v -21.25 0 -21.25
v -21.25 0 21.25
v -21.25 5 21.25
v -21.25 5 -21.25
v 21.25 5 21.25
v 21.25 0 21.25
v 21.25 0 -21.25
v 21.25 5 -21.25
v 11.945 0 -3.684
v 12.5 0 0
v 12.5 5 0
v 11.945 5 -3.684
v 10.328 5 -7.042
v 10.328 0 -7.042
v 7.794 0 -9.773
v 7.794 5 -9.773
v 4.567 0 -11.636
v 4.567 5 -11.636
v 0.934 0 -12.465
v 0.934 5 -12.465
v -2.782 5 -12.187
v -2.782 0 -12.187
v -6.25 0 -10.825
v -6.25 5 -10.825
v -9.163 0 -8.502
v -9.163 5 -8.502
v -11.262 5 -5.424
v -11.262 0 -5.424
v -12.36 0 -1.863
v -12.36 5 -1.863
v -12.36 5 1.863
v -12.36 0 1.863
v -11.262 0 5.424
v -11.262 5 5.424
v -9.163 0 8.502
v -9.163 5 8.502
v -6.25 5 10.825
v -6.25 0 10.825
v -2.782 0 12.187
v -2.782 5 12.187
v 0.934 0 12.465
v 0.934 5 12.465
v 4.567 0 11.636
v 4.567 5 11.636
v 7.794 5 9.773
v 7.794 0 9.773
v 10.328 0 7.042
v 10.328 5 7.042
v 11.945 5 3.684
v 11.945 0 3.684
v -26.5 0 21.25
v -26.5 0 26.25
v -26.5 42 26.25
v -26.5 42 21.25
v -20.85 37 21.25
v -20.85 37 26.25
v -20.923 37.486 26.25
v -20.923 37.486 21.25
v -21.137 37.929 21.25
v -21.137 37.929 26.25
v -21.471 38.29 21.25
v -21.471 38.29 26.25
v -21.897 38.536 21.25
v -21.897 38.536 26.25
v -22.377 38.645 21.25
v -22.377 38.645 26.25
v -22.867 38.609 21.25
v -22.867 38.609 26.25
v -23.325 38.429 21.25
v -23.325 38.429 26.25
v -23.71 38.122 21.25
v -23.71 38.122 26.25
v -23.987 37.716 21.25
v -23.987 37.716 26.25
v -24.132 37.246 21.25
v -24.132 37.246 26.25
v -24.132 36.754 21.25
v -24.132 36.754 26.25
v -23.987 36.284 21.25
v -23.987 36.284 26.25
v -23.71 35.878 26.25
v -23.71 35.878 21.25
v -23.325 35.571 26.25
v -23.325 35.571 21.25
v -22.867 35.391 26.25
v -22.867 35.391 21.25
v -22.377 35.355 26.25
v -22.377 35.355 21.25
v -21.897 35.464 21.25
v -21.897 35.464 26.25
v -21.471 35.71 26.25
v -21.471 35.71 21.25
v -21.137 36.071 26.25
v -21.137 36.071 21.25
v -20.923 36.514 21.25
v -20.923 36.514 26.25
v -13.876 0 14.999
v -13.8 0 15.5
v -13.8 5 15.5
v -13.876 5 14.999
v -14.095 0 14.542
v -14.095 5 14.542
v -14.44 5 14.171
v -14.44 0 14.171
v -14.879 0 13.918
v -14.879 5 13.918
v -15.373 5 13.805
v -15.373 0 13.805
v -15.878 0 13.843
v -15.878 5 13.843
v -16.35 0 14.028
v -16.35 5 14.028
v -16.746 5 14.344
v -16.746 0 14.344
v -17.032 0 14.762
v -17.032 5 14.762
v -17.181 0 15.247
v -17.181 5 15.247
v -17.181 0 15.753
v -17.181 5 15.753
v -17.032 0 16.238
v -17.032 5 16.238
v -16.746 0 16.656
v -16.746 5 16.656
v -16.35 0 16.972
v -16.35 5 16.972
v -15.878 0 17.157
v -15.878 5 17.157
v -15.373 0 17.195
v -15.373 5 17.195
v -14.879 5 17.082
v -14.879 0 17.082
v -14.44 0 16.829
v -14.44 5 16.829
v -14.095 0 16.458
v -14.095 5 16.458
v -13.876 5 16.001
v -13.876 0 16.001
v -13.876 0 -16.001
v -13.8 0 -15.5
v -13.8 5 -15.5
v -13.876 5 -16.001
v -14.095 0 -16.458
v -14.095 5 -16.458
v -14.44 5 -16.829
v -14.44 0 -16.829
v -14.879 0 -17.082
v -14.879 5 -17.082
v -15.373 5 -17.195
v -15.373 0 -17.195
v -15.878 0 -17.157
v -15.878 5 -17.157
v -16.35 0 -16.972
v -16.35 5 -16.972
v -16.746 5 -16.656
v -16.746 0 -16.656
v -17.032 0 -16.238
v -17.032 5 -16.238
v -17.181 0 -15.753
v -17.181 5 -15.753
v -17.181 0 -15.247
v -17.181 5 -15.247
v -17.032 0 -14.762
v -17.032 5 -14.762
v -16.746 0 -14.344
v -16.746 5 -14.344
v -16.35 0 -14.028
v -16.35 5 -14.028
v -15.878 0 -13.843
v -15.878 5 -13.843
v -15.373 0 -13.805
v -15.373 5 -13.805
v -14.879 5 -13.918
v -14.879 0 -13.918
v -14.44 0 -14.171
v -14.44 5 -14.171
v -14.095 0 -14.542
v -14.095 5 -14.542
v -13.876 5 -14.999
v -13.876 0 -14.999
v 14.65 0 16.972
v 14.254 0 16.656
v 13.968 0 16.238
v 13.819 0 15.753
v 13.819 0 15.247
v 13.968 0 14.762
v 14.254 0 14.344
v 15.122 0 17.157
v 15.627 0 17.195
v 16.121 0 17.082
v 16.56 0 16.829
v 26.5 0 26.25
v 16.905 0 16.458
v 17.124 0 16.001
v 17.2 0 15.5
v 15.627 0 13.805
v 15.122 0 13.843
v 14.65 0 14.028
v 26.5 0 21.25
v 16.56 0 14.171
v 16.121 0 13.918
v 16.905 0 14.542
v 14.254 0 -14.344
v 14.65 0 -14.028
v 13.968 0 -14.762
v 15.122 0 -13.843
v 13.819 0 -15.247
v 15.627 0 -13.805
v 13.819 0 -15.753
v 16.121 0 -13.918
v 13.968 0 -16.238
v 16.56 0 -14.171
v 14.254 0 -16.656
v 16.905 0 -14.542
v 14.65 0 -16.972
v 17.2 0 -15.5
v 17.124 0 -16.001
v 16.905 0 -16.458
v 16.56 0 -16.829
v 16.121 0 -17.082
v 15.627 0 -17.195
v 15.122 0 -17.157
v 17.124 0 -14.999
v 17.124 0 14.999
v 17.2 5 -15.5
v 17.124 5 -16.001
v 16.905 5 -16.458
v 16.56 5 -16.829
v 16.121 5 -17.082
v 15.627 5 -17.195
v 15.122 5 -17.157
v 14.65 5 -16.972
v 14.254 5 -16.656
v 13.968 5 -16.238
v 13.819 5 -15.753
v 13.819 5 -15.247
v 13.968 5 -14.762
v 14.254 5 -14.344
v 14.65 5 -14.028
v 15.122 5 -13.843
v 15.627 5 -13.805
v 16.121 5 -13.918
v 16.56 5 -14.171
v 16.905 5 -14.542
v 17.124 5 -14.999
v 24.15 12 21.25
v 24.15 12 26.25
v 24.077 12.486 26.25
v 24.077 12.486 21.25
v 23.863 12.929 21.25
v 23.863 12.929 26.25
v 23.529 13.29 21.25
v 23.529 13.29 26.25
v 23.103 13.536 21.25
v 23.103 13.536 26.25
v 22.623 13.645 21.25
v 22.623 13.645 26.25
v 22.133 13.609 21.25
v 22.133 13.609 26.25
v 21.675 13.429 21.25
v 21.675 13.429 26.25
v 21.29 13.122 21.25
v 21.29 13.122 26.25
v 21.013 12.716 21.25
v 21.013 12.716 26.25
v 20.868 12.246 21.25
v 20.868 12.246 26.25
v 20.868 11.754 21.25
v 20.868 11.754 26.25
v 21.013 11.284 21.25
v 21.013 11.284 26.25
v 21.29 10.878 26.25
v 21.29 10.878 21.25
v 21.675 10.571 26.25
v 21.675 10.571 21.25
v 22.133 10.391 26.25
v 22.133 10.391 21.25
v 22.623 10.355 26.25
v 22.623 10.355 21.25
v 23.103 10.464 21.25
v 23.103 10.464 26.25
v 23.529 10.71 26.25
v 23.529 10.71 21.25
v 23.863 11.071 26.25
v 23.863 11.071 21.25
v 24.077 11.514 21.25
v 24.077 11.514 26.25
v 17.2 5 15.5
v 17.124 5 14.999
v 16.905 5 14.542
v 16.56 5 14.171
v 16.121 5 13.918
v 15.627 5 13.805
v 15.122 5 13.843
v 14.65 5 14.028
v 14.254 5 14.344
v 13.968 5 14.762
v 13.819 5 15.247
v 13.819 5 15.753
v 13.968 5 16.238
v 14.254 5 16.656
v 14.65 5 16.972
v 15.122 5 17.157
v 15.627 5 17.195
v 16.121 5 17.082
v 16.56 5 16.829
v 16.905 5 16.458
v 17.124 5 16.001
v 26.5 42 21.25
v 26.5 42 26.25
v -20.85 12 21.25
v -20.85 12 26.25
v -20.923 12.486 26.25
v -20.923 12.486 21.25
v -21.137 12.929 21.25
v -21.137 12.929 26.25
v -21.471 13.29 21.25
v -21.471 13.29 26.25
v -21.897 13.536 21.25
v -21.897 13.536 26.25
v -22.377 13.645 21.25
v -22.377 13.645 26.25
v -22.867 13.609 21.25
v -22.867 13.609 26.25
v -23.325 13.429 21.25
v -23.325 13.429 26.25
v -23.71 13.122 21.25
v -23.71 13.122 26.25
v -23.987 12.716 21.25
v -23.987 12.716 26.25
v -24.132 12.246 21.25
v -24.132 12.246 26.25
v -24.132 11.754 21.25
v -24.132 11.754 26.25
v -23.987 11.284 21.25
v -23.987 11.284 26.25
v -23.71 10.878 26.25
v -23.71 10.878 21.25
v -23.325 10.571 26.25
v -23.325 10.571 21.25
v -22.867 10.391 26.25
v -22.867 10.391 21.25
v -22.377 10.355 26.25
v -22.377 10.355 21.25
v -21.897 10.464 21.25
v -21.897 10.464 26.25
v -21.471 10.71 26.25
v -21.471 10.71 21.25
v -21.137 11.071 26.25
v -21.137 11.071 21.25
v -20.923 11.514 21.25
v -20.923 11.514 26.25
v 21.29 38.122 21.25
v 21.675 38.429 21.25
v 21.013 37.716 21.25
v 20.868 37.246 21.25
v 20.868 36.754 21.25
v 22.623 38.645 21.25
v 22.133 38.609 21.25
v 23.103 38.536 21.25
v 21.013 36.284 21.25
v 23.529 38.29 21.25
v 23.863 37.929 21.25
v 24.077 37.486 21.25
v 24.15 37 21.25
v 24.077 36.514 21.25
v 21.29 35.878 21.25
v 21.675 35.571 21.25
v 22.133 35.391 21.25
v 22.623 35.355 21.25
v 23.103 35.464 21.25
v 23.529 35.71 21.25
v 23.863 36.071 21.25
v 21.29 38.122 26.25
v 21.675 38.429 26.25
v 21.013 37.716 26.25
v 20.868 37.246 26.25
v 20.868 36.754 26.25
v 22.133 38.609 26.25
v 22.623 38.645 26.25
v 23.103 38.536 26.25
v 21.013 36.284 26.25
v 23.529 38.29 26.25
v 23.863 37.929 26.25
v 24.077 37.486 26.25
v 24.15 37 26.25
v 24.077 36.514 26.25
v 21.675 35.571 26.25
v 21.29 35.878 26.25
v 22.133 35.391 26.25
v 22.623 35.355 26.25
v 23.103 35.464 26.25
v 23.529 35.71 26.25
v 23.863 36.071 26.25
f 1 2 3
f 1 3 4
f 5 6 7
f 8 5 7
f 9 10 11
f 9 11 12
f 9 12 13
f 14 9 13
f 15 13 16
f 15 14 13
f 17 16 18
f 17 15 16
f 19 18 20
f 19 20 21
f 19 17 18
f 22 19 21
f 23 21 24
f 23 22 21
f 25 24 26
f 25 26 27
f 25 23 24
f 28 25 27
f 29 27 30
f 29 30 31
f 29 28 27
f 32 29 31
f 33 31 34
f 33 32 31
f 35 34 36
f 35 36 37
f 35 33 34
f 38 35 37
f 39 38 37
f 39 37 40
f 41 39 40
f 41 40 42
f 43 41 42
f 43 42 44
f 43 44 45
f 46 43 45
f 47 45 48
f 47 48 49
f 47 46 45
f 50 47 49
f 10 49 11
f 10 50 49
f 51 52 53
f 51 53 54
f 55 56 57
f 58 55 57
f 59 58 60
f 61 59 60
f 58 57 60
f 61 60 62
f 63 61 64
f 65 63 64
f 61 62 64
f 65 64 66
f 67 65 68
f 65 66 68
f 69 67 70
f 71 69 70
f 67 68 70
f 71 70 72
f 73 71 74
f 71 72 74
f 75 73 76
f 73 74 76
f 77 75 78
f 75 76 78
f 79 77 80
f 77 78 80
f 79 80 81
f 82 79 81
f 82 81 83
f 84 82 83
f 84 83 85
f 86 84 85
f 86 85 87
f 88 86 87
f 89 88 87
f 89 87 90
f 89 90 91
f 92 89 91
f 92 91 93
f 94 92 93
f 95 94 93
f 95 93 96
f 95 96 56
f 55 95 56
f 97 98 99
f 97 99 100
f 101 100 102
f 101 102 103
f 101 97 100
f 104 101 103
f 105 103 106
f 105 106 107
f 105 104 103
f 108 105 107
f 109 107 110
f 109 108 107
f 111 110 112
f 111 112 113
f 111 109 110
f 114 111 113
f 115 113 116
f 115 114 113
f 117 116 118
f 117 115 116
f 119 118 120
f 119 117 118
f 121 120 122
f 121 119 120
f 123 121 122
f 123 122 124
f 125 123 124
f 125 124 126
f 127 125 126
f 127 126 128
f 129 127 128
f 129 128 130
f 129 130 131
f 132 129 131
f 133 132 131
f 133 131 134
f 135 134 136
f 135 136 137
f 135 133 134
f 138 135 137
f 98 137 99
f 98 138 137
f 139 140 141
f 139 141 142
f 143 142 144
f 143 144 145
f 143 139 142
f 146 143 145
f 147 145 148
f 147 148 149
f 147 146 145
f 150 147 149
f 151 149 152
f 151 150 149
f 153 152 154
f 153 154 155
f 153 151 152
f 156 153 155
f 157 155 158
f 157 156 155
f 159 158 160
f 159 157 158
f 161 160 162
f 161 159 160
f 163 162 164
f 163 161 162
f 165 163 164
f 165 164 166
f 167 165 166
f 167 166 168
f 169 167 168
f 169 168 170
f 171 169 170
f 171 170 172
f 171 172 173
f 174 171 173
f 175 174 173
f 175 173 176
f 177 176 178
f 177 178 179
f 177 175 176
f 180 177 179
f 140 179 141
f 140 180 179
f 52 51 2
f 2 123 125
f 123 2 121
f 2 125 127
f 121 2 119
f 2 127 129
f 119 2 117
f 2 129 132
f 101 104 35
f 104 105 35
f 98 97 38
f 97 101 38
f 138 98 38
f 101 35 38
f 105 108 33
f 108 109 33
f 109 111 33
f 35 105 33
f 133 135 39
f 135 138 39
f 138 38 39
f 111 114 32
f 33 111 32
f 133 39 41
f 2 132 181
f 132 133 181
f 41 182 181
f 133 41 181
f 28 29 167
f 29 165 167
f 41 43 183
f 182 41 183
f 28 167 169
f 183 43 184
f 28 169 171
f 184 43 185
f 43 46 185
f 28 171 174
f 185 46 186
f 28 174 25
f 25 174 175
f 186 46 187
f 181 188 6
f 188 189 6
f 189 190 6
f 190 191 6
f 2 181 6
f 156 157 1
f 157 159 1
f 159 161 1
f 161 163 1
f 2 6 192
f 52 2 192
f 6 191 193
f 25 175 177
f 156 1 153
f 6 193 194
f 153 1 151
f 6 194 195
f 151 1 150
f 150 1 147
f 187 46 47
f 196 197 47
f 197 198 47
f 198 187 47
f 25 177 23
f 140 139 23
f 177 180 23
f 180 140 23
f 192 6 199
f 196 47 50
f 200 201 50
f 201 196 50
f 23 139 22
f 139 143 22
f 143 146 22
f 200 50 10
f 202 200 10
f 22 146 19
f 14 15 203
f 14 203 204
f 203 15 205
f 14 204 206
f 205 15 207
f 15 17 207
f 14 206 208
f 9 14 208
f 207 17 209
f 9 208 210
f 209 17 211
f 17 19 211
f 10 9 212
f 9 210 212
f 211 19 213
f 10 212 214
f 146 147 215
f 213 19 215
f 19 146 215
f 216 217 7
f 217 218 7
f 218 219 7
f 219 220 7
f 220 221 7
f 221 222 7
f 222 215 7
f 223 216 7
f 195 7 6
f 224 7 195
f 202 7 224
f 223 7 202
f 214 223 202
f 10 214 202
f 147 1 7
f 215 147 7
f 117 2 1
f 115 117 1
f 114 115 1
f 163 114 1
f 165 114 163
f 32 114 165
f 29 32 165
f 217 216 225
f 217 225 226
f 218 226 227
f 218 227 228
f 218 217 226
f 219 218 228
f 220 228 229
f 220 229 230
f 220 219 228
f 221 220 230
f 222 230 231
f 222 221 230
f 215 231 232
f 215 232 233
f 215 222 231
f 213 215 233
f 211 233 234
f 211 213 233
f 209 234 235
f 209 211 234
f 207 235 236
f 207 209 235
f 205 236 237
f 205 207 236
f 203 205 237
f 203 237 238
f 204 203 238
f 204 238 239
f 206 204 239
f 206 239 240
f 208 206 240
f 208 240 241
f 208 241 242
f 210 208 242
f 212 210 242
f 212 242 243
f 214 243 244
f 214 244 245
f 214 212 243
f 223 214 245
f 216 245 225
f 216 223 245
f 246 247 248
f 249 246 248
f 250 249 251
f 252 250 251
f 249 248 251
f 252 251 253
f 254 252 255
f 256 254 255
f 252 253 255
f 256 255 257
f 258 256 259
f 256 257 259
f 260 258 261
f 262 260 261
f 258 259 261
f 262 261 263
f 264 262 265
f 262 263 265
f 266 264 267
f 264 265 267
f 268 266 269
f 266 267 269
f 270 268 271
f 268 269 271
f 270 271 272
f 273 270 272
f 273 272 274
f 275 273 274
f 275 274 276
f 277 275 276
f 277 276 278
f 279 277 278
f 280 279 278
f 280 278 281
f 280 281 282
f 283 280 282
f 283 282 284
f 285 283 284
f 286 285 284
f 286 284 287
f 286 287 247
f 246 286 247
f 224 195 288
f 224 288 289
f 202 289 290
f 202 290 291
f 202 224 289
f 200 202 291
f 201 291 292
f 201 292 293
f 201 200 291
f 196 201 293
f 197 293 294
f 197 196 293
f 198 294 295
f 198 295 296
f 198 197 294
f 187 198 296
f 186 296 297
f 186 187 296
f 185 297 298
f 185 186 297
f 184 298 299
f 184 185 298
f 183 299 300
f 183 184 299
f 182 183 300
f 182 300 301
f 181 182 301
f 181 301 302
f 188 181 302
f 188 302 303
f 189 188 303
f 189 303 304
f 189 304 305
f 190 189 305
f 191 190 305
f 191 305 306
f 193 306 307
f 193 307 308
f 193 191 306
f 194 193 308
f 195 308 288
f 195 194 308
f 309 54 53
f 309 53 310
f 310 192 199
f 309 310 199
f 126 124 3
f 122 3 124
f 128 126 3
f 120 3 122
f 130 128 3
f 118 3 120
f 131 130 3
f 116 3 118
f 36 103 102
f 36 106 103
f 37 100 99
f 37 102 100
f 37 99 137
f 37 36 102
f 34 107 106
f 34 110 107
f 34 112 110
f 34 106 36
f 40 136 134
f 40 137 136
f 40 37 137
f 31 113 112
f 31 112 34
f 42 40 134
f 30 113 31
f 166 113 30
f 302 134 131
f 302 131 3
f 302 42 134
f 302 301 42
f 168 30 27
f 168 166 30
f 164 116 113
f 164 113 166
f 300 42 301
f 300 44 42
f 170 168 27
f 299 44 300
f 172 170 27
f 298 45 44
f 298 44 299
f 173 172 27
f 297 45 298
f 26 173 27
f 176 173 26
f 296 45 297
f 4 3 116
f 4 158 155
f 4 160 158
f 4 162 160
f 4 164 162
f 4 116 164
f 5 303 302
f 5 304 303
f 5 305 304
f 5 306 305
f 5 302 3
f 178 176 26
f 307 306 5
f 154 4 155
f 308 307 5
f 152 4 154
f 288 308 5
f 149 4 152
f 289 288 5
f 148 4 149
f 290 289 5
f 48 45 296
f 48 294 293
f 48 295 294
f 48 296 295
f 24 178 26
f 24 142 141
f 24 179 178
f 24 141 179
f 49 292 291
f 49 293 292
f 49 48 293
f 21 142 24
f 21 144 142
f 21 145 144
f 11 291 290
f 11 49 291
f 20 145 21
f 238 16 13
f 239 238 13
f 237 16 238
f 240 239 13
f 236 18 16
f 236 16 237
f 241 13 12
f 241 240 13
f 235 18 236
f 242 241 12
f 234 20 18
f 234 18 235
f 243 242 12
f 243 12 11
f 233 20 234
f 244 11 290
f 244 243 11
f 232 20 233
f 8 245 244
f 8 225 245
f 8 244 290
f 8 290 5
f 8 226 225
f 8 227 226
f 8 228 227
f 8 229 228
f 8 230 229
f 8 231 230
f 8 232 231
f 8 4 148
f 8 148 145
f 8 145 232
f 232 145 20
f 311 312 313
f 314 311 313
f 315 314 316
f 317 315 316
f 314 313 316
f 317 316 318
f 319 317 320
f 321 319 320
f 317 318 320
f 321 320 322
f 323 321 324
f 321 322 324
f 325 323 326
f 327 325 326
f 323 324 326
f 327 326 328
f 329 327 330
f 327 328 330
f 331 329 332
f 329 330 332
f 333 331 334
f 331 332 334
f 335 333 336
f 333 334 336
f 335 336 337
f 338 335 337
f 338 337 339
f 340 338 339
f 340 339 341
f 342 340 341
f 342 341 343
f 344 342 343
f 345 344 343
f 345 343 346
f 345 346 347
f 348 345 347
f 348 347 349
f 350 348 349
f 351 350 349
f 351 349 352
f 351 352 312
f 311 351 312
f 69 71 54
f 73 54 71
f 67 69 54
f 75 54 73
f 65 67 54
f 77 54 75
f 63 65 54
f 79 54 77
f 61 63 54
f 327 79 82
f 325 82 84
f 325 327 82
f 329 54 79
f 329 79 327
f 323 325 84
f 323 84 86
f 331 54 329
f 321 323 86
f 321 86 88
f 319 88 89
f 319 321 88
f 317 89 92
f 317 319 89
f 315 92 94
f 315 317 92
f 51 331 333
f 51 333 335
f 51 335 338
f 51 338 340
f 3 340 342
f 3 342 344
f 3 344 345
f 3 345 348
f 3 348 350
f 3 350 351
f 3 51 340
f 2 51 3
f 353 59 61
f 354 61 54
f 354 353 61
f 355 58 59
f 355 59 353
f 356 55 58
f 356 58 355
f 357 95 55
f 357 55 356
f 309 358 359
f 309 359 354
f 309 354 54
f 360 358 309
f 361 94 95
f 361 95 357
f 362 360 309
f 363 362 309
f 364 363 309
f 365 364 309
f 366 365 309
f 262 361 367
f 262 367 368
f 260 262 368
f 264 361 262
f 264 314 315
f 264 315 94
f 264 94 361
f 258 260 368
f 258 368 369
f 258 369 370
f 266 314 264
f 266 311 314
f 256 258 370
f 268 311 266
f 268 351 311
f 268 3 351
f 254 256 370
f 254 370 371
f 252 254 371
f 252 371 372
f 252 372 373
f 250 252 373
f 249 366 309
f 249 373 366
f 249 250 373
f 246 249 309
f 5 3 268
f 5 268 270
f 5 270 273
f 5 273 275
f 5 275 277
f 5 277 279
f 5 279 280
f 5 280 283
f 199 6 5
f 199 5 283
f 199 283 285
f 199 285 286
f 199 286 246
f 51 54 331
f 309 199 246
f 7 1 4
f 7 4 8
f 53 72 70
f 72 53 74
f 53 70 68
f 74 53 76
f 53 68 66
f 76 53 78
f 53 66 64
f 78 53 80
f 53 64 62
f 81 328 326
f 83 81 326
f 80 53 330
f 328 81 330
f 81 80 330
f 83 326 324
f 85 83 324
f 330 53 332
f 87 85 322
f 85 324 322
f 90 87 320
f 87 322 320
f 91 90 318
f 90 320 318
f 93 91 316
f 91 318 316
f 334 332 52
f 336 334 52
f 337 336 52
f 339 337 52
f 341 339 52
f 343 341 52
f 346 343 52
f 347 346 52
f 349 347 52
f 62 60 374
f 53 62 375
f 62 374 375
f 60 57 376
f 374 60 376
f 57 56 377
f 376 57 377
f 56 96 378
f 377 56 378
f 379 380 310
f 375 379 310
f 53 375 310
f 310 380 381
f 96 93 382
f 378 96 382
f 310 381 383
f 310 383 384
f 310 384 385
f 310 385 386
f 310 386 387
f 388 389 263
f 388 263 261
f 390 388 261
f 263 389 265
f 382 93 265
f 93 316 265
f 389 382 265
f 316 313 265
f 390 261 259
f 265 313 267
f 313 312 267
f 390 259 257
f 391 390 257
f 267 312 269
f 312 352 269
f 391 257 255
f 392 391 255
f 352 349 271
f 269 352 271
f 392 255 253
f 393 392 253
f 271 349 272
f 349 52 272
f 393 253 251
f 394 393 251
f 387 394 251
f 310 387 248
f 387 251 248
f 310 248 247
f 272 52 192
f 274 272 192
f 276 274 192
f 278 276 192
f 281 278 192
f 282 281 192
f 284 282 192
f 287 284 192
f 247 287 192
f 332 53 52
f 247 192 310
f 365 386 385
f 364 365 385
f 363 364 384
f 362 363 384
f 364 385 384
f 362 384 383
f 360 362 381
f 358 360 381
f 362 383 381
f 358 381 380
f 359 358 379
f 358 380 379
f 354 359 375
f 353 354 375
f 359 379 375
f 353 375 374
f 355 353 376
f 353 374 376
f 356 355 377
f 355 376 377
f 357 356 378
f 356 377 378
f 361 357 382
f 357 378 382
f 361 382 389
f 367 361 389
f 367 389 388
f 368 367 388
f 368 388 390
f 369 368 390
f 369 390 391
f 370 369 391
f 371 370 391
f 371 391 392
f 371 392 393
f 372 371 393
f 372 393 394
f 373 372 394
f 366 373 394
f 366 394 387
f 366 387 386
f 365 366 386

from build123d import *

# Parameters (mm, degrees)
SKETCH1_W           = 42.5
SKETCH1_H           = 42.5
SKETCH1_R           = 1.7
SKETCH1_R_2         = 12.5
BOSS_EXTRUDE1_DEPTH = 5
SKETCH3_W           = 53
SKETCH3_H           = 5
BOSS_EXTRUDE3_DEPTH = 42
SKETCH4_R           = 1.65
CUT_EXTRUDE1_DEPTH  = 42


with BuildPart() as part:
    # Sketch1 → Boss-Extrude1 (new body)
    with BuildSketch(Plane(origin=(0, 0, 0), x_dir=(1, 0, 0), z_dir=(0, 1, 0))):
        Rectangle(SKETCH1_W, SKETCH1_H)
        with Locations((-15.5, 15.5)):
            Circle(SKETCH1_R, mode=Mode.SUBTRACT)
        with Locations((15.5, 15.5)):
            Circle(SKETCH1_R, mode=Mode.SUBTRACT)
        with Locations((-15.5, -15.5)):
            Circle(SKETCH1_R, mode=Mode.SUBTRACT)
        with Locations((15.5, -15.5)):
            Circle(SKETCH1_R, mode=Mode.SUBTRACT)
        Circle(SKETCH1_R_2, mode=Mode.SUBTRACT)
    extrude(amount=BOSS_EXTRUDE1_DEPTH)

    # Sketch3 → Boss-Extrude3 (add)
    with BuildSketch(Plane(origin=(0, 0, 0), x_dir=(1, 0, 0), z_dir=(0, 1, 0))):
        with Locations((0, -23.75)):
            Rectangle(SKETCH3_W, SKETCH3_H)
    extrude(amount=BOSS_EXTRUDE3_DEPTH)

    # Sketch4 → Cut-Extrude1 (cut)
    with BuildSketch(Plane.XY.offset(26.25)):
        with Locations((22.5, 37)):
            Circle(SKETCH4_R)
        with Locations((22.5, 12)):
            Circle(SKETCH4_R)
        with Locations((-22.5, 37)):
            Circle(SKETCH4_R)
        with Locations((-22.5, 12)):
            Circle(SKETCH4_R)
    extrude(amount=-CUT_EXTRUDE1_DEPTH, mode=Mode.SUBTRACT)


solid = part.part
